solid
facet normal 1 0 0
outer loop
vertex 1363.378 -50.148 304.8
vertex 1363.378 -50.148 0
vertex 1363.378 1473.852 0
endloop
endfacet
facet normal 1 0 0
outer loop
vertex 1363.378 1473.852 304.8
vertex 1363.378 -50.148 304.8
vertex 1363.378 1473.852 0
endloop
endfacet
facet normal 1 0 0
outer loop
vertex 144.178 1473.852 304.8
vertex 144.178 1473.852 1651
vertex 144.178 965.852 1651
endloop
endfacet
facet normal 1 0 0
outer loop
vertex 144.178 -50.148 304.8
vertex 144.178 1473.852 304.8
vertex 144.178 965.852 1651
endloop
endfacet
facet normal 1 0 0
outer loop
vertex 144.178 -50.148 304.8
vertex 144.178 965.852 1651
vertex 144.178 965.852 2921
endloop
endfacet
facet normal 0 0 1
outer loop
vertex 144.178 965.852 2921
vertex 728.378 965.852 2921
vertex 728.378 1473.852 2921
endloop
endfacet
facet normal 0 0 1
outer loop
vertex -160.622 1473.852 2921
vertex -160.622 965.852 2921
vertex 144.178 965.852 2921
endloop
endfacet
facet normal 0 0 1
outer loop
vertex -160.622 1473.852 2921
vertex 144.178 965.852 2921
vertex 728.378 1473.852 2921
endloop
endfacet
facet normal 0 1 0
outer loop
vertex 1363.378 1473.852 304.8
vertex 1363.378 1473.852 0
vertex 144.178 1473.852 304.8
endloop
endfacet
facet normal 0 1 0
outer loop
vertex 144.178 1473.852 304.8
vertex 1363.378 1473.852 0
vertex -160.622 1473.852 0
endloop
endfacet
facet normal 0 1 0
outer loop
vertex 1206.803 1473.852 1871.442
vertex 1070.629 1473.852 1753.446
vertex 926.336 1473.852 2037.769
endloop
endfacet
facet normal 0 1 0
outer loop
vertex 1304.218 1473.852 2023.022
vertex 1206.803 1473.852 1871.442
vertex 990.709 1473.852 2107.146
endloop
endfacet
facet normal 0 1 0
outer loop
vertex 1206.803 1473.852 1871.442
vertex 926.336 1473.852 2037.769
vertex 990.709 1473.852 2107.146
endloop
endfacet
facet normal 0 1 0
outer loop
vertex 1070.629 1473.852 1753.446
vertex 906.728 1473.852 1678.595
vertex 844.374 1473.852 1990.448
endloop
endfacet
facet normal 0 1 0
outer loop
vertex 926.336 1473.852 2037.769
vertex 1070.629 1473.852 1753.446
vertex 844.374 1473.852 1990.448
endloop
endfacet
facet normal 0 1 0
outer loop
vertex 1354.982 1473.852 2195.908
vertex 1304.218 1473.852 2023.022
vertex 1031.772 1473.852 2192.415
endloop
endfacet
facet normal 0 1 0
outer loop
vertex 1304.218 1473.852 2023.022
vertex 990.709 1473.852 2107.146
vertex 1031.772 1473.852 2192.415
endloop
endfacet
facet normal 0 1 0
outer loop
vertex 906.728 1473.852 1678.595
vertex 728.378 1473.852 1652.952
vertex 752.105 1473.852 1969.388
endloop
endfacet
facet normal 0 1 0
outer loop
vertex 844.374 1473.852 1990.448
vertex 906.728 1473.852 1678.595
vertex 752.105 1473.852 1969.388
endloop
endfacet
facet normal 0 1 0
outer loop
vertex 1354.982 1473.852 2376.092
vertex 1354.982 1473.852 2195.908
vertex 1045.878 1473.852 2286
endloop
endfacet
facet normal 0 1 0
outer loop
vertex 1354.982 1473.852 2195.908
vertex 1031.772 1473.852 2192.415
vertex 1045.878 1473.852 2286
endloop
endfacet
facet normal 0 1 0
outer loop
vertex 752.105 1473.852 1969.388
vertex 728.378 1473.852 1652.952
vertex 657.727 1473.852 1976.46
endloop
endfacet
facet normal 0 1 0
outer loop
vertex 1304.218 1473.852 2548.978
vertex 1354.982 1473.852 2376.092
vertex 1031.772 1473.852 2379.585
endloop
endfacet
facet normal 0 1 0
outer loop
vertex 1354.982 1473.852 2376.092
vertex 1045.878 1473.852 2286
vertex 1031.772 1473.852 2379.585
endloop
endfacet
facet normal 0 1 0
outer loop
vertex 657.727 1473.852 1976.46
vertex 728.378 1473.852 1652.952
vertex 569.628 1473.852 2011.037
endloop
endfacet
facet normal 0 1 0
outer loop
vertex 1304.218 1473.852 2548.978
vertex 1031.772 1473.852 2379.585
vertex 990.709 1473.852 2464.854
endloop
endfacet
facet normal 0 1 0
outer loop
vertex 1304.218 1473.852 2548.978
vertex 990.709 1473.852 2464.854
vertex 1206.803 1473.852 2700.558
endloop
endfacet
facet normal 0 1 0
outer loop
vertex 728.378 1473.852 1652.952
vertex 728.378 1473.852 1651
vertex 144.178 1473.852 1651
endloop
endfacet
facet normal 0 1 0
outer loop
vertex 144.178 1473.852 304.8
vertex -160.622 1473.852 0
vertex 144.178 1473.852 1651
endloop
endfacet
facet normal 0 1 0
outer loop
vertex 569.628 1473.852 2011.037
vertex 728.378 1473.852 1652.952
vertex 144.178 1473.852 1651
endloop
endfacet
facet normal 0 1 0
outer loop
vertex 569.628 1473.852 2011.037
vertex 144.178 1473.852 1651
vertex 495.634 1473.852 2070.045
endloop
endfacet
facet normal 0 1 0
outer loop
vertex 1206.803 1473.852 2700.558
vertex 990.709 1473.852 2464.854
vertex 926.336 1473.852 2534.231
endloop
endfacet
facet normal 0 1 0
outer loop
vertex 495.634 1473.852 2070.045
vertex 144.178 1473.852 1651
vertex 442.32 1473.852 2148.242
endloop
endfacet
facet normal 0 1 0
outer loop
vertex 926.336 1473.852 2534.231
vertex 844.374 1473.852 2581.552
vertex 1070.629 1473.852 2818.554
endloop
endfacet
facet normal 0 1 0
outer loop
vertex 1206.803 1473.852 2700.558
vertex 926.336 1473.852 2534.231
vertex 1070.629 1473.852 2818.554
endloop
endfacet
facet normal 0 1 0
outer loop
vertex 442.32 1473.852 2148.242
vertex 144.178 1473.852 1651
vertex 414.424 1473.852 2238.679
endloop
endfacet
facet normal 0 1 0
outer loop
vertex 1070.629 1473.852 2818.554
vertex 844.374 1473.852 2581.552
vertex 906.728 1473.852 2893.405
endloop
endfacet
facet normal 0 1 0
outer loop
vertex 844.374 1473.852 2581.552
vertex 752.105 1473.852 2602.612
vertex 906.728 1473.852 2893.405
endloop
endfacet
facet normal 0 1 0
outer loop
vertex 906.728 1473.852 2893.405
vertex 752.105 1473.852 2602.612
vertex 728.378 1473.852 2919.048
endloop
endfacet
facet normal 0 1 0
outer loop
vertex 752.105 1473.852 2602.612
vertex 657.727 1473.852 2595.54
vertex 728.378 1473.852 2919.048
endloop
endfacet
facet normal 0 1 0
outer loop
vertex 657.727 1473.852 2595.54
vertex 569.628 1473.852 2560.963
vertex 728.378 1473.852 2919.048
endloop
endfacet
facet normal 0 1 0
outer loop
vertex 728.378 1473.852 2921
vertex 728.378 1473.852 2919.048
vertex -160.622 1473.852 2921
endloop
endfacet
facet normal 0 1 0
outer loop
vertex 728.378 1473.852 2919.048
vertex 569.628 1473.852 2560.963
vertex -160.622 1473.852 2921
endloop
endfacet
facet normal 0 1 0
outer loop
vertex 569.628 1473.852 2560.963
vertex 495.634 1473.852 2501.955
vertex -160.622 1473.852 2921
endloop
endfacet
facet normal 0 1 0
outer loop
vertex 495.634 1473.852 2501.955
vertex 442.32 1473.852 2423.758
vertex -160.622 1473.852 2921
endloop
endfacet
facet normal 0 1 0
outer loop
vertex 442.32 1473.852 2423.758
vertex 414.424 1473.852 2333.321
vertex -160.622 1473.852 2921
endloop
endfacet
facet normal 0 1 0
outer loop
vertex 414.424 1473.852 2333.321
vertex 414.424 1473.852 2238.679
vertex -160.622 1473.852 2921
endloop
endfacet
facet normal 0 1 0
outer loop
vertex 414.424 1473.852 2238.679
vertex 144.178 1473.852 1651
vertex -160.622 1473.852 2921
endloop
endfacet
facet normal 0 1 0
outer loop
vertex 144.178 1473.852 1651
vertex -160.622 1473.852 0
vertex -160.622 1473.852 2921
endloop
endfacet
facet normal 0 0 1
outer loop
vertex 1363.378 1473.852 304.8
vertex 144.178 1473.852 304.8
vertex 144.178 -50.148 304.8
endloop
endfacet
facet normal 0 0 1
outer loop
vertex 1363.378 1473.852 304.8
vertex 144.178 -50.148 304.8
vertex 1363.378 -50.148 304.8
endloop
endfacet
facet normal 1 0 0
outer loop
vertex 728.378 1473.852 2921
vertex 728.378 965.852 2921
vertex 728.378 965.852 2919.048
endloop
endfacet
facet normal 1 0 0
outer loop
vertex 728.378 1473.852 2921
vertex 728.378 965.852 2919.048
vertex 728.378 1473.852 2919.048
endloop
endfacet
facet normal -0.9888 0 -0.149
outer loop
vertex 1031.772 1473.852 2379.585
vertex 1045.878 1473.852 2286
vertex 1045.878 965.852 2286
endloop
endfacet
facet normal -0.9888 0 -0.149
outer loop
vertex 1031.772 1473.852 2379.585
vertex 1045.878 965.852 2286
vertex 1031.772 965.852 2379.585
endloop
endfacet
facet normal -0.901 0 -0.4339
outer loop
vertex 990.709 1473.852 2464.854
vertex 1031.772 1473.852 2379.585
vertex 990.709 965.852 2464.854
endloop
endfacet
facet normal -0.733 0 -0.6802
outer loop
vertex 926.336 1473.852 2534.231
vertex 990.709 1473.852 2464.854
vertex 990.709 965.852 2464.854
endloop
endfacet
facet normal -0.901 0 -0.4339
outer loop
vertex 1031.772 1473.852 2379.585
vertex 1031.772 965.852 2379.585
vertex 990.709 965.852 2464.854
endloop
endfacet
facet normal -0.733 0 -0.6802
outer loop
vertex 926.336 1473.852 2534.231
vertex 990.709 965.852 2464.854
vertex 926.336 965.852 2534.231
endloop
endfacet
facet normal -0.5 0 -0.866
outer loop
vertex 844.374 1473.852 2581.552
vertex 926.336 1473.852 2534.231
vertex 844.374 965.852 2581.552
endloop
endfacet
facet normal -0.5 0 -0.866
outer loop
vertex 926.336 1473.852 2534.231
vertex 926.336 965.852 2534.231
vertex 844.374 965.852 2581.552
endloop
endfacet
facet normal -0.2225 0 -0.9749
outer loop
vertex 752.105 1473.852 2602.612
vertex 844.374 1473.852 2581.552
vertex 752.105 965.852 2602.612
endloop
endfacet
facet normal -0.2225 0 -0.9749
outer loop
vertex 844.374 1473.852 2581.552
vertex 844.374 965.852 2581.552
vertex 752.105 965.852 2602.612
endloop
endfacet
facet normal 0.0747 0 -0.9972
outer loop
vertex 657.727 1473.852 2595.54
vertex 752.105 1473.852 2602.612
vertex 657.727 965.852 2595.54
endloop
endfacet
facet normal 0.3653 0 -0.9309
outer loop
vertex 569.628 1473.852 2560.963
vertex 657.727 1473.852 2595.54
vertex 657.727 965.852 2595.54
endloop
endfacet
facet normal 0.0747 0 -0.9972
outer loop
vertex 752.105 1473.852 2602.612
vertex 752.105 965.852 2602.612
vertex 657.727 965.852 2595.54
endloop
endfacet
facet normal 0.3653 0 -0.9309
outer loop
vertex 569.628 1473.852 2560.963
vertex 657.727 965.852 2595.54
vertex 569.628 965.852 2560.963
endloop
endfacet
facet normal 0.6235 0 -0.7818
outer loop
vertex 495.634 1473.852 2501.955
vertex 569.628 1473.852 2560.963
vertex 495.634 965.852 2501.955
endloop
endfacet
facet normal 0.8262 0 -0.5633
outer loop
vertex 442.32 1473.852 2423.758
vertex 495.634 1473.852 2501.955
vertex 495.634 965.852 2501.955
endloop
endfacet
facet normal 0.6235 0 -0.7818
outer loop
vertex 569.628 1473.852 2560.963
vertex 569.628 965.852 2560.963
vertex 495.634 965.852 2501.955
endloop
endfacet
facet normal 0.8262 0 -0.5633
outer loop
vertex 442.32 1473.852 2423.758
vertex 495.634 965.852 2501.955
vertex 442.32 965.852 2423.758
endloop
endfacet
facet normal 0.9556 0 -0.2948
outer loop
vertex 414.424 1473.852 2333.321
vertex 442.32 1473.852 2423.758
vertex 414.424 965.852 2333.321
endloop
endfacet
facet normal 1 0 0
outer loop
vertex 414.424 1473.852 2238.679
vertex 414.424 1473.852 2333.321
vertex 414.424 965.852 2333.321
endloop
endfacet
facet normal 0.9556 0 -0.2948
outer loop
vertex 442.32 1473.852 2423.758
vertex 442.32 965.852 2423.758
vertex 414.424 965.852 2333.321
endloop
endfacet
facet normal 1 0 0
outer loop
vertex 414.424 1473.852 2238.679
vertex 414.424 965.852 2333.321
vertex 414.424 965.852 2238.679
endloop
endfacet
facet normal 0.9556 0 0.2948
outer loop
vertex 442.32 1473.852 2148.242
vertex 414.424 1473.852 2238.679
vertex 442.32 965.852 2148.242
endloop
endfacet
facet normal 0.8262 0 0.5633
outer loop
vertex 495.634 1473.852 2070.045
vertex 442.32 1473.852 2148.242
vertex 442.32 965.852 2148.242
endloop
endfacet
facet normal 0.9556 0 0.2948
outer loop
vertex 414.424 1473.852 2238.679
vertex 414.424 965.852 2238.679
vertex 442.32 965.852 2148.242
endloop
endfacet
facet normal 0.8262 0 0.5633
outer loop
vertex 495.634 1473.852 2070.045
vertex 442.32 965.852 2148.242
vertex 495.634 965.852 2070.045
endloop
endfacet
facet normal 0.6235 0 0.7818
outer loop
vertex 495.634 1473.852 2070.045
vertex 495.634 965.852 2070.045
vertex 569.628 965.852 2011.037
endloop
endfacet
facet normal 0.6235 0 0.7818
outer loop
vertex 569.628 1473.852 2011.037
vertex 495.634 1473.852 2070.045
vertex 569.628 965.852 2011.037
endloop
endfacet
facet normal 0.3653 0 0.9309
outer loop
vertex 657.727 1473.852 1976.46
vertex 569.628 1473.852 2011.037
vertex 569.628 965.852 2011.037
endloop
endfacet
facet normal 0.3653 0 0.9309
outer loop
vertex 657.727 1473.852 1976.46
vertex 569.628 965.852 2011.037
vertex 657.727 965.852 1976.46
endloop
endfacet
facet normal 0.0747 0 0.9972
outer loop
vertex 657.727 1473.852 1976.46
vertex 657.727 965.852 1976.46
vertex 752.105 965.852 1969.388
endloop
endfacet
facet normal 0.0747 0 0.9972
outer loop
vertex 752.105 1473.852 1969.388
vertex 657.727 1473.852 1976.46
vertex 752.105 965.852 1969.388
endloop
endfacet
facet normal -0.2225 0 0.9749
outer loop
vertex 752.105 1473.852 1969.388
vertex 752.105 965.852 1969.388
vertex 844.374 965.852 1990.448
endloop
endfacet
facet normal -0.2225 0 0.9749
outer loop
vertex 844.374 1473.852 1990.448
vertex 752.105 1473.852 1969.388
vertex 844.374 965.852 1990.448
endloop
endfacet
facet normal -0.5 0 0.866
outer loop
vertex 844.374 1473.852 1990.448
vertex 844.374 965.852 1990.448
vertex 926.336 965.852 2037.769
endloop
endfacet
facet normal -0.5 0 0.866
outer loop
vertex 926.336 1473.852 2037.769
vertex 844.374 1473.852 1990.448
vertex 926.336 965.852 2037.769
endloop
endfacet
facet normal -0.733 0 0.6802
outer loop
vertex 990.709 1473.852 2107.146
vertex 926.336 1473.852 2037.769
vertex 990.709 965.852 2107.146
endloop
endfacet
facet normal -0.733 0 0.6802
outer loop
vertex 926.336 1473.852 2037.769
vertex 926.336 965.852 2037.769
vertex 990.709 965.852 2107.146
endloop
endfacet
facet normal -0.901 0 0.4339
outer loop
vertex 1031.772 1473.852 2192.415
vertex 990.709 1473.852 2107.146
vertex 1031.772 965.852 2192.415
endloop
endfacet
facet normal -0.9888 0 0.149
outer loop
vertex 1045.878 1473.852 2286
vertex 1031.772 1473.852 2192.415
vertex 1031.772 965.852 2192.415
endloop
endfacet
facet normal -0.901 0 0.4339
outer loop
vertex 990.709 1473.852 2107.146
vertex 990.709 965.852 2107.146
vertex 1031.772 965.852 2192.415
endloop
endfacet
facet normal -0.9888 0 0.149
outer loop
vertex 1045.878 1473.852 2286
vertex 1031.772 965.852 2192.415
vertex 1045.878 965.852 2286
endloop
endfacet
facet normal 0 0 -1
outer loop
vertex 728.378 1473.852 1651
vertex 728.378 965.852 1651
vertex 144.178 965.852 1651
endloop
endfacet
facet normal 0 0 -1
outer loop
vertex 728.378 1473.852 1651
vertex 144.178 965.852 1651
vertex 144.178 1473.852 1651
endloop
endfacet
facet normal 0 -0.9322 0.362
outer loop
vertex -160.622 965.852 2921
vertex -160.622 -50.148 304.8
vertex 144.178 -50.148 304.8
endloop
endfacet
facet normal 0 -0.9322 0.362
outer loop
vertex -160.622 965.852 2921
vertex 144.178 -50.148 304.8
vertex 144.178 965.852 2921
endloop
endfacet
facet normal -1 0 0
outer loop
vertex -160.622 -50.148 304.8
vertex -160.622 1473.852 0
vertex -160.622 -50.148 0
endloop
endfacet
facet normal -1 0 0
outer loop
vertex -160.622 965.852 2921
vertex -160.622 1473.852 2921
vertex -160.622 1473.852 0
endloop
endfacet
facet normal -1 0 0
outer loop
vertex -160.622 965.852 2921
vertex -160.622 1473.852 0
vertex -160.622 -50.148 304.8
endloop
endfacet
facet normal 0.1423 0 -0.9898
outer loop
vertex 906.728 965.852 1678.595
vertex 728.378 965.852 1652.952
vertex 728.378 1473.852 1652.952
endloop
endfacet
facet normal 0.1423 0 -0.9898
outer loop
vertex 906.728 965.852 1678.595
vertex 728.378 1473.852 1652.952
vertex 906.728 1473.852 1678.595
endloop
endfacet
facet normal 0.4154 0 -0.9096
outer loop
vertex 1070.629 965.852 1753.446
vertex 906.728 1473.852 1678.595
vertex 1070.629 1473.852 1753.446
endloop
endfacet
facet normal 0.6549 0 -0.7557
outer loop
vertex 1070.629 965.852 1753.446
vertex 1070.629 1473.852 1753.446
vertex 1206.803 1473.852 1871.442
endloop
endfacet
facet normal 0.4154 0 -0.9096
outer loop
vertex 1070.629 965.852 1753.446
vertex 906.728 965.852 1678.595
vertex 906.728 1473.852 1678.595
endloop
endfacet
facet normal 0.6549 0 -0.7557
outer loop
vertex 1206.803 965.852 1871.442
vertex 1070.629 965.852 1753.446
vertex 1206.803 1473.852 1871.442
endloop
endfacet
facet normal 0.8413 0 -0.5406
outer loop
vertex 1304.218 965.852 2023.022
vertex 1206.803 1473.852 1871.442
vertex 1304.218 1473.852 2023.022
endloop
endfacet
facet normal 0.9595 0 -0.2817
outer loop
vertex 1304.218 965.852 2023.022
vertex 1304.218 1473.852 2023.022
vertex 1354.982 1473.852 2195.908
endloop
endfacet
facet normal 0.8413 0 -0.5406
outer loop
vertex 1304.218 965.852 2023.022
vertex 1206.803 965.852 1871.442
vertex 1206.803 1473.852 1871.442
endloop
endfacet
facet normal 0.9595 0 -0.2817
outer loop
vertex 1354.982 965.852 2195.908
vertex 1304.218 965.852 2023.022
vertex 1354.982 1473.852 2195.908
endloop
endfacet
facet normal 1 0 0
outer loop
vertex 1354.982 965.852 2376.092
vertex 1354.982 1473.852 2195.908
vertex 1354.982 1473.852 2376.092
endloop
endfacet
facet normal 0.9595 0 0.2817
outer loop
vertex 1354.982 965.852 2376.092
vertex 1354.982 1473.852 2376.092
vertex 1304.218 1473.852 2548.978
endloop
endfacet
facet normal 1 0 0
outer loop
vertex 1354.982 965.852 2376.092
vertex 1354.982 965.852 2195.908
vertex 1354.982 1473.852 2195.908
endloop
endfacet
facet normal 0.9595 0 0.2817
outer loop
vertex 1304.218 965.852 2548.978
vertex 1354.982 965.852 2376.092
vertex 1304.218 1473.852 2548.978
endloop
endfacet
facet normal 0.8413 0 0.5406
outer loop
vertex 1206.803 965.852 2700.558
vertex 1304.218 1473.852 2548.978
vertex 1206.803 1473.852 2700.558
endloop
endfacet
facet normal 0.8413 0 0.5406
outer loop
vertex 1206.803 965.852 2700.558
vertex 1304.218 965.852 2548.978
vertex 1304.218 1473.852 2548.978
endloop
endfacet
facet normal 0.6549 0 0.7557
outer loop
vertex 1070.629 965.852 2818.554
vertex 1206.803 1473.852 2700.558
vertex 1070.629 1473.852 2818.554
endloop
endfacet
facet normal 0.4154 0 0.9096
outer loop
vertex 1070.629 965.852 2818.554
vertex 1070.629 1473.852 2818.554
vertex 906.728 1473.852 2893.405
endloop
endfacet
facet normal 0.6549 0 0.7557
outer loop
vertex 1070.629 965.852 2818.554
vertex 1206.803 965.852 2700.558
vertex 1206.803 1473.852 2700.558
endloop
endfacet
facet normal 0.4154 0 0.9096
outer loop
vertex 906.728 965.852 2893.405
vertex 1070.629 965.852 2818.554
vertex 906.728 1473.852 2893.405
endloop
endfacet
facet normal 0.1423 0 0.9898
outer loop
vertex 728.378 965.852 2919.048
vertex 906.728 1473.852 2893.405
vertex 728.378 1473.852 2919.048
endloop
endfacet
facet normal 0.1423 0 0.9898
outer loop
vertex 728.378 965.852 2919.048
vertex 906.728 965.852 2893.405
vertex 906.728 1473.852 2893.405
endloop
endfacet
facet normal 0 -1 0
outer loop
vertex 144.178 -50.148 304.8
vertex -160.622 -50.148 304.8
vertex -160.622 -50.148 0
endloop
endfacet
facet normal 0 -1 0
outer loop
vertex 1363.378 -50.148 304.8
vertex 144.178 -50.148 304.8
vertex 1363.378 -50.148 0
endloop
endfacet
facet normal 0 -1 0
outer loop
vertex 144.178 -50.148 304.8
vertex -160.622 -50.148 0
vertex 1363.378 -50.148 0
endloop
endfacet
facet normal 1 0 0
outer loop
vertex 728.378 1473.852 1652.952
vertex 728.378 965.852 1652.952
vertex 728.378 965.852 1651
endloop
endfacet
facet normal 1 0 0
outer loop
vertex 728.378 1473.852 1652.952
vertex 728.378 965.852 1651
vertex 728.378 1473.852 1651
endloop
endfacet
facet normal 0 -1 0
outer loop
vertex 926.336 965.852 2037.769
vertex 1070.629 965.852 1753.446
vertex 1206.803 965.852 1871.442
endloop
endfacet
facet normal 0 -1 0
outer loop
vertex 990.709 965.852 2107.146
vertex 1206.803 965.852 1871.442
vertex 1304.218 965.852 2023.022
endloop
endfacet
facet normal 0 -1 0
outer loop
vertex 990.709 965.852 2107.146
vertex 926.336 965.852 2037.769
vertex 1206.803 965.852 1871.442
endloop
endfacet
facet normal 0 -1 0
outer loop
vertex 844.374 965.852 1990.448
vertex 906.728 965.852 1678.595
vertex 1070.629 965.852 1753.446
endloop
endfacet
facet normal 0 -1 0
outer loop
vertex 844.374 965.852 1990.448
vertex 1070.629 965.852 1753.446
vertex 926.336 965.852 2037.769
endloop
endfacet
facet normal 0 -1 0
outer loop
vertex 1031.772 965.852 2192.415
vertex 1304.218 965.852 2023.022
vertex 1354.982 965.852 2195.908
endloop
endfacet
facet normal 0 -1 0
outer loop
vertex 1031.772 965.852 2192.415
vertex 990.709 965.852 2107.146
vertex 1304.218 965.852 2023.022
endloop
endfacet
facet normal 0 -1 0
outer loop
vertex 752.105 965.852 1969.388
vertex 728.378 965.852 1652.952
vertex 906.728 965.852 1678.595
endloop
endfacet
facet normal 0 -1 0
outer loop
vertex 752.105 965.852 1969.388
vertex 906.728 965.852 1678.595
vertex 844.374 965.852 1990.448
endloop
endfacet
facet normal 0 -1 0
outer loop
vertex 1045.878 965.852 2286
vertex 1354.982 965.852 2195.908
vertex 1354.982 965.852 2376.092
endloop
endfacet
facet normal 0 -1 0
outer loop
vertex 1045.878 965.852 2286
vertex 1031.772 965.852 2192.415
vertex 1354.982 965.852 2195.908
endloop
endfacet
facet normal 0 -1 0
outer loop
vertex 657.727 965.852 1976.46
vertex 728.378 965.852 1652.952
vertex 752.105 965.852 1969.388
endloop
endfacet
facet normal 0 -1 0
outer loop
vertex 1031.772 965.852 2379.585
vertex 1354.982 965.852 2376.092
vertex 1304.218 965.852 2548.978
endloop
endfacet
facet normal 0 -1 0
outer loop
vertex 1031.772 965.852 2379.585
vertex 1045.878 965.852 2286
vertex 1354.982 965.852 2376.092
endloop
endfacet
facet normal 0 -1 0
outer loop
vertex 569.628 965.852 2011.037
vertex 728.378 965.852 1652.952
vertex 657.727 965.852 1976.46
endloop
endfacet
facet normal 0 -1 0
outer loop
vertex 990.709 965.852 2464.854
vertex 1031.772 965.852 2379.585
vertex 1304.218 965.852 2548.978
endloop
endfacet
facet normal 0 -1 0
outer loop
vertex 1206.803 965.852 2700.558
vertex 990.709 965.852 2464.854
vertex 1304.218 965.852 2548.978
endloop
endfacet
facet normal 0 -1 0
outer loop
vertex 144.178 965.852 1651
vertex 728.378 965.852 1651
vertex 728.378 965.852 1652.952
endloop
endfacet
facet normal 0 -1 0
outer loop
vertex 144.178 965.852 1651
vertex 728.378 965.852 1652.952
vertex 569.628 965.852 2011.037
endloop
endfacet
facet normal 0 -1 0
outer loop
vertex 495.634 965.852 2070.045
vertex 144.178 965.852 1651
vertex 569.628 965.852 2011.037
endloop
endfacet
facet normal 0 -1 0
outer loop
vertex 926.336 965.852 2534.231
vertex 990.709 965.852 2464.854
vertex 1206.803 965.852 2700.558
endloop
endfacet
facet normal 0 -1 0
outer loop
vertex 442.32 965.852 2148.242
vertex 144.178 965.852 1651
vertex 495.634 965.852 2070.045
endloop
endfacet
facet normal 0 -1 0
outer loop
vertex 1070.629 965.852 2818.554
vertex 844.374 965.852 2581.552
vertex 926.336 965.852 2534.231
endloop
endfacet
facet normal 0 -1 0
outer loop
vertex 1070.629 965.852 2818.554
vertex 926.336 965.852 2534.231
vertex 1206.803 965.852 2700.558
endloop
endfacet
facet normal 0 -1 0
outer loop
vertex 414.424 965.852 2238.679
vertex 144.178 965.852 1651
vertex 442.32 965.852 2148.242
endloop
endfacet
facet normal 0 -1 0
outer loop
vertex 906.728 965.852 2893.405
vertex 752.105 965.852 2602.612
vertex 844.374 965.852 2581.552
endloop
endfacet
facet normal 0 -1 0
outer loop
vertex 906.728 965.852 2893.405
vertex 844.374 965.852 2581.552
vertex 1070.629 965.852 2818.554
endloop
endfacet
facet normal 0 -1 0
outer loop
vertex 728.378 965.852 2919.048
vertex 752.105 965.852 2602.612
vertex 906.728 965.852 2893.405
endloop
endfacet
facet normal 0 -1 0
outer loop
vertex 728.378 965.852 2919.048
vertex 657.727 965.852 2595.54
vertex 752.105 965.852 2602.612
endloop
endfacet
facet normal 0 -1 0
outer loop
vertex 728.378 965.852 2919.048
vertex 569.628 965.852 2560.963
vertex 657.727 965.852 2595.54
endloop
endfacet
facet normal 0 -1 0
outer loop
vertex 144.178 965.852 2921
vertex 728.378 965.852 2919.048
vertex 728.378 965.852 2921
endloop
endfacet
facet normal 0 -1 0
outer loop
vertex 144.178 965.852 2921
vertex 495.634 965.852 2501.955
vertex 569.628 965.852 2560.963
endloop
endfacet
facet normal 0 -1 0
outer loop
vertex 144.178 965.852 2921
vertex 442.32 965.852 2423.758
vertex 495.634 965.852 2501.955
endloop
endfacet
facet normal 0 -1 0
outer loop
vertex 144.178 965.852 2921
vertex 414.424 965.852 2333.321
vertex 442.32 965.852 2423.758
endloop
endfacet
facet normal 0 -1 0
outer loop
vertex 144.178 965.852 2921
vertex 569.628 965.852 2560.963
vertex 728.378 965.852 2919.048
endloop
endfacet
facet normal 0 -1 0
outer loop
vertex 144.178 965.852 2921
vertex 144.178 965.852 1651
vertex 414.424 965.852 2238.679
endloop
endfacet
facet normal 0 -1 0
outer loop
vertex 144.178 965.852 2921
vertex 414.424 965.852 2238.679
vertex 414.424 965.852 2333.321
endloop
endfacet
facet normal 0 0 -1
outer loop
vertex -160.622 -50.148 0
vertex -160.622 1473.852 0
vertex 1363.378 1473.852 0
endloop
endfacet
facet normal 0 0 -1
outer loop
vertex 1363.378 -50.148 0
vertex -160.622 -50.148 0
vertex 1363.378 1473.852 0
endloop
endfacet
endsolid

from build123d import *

# Parameters (mm, degrees)
F0_W     = 1524
F0_H     = 1524
F1_DEPTH = 304.8
F3_DEPTH = 304.8
F4_W     = 508
F4_H     = 1270
F5_DEPTH = 584.2
F7_DEPTH = 508
F8_R     = 317.5
F9_DEPTH = 508


with BuildPart() as f1:
    # F0 (on Top) → F1 (new body)
    with BuildSketch(Plane.XY):
        with Locations((601.377745986, 711.8515538871)):
            Rectangle(F0_W, F0_H)
    extrude(amount=F1_DEPTH)

    # F2 (on face) → F3 (join)
    with BuildSketch(Plane(origin=(-160.622254014, 0, 0), x_dir=(0, -1, 0), z_dir=(-1, 0, 0))):
        Polygon((-1473.8515538871, 2921), (-1473.8515538871, 304.8), (50.1484461129, 304.8), (-965.8515538871, 2921), align=None)
    extrude(amount=-F3_DEPTH)

    # F4 (on face) → F5 (join)
    with BuildSketch(Plane.YZ.offset(144.177745986)):
        with Locations((1219.8515538871, 2286)):
            Rectangle(F4_W, F4_H)
    extrude(amount=F5_DEPTH)

    # F6 (on face) → F7 (join)
    with BuildSketch(Plane.XZ.offset(-965.8515538871)):
        with BuildLine():
            ThreePointArc((728.377745986, 1652.952168632), (1176.0101603617, 1838.3675856243), (1361.425577354, 2286))
            ThreePointArc((1361.425577354, 2286), (1176.0101603617, 2733.6324143757), (728.377745986, 2919.047831368))
            Line((728.377745986, 2919.047831368), (728.377745986, 1652.952168632))
        make_face()
    extrude(amount=-F7_DEPTH)

    # F8 (on face) → F9 (cut)
    with BuildSketch(Plane.XZ.offset(-965.8515538871)):
        with Locations((728.377745986, 2286)):
            Circle(F8_R)
    extrude(amount=-F9_DEPTH, mode=Mode.SUBTRACT)


solid = f1.part
